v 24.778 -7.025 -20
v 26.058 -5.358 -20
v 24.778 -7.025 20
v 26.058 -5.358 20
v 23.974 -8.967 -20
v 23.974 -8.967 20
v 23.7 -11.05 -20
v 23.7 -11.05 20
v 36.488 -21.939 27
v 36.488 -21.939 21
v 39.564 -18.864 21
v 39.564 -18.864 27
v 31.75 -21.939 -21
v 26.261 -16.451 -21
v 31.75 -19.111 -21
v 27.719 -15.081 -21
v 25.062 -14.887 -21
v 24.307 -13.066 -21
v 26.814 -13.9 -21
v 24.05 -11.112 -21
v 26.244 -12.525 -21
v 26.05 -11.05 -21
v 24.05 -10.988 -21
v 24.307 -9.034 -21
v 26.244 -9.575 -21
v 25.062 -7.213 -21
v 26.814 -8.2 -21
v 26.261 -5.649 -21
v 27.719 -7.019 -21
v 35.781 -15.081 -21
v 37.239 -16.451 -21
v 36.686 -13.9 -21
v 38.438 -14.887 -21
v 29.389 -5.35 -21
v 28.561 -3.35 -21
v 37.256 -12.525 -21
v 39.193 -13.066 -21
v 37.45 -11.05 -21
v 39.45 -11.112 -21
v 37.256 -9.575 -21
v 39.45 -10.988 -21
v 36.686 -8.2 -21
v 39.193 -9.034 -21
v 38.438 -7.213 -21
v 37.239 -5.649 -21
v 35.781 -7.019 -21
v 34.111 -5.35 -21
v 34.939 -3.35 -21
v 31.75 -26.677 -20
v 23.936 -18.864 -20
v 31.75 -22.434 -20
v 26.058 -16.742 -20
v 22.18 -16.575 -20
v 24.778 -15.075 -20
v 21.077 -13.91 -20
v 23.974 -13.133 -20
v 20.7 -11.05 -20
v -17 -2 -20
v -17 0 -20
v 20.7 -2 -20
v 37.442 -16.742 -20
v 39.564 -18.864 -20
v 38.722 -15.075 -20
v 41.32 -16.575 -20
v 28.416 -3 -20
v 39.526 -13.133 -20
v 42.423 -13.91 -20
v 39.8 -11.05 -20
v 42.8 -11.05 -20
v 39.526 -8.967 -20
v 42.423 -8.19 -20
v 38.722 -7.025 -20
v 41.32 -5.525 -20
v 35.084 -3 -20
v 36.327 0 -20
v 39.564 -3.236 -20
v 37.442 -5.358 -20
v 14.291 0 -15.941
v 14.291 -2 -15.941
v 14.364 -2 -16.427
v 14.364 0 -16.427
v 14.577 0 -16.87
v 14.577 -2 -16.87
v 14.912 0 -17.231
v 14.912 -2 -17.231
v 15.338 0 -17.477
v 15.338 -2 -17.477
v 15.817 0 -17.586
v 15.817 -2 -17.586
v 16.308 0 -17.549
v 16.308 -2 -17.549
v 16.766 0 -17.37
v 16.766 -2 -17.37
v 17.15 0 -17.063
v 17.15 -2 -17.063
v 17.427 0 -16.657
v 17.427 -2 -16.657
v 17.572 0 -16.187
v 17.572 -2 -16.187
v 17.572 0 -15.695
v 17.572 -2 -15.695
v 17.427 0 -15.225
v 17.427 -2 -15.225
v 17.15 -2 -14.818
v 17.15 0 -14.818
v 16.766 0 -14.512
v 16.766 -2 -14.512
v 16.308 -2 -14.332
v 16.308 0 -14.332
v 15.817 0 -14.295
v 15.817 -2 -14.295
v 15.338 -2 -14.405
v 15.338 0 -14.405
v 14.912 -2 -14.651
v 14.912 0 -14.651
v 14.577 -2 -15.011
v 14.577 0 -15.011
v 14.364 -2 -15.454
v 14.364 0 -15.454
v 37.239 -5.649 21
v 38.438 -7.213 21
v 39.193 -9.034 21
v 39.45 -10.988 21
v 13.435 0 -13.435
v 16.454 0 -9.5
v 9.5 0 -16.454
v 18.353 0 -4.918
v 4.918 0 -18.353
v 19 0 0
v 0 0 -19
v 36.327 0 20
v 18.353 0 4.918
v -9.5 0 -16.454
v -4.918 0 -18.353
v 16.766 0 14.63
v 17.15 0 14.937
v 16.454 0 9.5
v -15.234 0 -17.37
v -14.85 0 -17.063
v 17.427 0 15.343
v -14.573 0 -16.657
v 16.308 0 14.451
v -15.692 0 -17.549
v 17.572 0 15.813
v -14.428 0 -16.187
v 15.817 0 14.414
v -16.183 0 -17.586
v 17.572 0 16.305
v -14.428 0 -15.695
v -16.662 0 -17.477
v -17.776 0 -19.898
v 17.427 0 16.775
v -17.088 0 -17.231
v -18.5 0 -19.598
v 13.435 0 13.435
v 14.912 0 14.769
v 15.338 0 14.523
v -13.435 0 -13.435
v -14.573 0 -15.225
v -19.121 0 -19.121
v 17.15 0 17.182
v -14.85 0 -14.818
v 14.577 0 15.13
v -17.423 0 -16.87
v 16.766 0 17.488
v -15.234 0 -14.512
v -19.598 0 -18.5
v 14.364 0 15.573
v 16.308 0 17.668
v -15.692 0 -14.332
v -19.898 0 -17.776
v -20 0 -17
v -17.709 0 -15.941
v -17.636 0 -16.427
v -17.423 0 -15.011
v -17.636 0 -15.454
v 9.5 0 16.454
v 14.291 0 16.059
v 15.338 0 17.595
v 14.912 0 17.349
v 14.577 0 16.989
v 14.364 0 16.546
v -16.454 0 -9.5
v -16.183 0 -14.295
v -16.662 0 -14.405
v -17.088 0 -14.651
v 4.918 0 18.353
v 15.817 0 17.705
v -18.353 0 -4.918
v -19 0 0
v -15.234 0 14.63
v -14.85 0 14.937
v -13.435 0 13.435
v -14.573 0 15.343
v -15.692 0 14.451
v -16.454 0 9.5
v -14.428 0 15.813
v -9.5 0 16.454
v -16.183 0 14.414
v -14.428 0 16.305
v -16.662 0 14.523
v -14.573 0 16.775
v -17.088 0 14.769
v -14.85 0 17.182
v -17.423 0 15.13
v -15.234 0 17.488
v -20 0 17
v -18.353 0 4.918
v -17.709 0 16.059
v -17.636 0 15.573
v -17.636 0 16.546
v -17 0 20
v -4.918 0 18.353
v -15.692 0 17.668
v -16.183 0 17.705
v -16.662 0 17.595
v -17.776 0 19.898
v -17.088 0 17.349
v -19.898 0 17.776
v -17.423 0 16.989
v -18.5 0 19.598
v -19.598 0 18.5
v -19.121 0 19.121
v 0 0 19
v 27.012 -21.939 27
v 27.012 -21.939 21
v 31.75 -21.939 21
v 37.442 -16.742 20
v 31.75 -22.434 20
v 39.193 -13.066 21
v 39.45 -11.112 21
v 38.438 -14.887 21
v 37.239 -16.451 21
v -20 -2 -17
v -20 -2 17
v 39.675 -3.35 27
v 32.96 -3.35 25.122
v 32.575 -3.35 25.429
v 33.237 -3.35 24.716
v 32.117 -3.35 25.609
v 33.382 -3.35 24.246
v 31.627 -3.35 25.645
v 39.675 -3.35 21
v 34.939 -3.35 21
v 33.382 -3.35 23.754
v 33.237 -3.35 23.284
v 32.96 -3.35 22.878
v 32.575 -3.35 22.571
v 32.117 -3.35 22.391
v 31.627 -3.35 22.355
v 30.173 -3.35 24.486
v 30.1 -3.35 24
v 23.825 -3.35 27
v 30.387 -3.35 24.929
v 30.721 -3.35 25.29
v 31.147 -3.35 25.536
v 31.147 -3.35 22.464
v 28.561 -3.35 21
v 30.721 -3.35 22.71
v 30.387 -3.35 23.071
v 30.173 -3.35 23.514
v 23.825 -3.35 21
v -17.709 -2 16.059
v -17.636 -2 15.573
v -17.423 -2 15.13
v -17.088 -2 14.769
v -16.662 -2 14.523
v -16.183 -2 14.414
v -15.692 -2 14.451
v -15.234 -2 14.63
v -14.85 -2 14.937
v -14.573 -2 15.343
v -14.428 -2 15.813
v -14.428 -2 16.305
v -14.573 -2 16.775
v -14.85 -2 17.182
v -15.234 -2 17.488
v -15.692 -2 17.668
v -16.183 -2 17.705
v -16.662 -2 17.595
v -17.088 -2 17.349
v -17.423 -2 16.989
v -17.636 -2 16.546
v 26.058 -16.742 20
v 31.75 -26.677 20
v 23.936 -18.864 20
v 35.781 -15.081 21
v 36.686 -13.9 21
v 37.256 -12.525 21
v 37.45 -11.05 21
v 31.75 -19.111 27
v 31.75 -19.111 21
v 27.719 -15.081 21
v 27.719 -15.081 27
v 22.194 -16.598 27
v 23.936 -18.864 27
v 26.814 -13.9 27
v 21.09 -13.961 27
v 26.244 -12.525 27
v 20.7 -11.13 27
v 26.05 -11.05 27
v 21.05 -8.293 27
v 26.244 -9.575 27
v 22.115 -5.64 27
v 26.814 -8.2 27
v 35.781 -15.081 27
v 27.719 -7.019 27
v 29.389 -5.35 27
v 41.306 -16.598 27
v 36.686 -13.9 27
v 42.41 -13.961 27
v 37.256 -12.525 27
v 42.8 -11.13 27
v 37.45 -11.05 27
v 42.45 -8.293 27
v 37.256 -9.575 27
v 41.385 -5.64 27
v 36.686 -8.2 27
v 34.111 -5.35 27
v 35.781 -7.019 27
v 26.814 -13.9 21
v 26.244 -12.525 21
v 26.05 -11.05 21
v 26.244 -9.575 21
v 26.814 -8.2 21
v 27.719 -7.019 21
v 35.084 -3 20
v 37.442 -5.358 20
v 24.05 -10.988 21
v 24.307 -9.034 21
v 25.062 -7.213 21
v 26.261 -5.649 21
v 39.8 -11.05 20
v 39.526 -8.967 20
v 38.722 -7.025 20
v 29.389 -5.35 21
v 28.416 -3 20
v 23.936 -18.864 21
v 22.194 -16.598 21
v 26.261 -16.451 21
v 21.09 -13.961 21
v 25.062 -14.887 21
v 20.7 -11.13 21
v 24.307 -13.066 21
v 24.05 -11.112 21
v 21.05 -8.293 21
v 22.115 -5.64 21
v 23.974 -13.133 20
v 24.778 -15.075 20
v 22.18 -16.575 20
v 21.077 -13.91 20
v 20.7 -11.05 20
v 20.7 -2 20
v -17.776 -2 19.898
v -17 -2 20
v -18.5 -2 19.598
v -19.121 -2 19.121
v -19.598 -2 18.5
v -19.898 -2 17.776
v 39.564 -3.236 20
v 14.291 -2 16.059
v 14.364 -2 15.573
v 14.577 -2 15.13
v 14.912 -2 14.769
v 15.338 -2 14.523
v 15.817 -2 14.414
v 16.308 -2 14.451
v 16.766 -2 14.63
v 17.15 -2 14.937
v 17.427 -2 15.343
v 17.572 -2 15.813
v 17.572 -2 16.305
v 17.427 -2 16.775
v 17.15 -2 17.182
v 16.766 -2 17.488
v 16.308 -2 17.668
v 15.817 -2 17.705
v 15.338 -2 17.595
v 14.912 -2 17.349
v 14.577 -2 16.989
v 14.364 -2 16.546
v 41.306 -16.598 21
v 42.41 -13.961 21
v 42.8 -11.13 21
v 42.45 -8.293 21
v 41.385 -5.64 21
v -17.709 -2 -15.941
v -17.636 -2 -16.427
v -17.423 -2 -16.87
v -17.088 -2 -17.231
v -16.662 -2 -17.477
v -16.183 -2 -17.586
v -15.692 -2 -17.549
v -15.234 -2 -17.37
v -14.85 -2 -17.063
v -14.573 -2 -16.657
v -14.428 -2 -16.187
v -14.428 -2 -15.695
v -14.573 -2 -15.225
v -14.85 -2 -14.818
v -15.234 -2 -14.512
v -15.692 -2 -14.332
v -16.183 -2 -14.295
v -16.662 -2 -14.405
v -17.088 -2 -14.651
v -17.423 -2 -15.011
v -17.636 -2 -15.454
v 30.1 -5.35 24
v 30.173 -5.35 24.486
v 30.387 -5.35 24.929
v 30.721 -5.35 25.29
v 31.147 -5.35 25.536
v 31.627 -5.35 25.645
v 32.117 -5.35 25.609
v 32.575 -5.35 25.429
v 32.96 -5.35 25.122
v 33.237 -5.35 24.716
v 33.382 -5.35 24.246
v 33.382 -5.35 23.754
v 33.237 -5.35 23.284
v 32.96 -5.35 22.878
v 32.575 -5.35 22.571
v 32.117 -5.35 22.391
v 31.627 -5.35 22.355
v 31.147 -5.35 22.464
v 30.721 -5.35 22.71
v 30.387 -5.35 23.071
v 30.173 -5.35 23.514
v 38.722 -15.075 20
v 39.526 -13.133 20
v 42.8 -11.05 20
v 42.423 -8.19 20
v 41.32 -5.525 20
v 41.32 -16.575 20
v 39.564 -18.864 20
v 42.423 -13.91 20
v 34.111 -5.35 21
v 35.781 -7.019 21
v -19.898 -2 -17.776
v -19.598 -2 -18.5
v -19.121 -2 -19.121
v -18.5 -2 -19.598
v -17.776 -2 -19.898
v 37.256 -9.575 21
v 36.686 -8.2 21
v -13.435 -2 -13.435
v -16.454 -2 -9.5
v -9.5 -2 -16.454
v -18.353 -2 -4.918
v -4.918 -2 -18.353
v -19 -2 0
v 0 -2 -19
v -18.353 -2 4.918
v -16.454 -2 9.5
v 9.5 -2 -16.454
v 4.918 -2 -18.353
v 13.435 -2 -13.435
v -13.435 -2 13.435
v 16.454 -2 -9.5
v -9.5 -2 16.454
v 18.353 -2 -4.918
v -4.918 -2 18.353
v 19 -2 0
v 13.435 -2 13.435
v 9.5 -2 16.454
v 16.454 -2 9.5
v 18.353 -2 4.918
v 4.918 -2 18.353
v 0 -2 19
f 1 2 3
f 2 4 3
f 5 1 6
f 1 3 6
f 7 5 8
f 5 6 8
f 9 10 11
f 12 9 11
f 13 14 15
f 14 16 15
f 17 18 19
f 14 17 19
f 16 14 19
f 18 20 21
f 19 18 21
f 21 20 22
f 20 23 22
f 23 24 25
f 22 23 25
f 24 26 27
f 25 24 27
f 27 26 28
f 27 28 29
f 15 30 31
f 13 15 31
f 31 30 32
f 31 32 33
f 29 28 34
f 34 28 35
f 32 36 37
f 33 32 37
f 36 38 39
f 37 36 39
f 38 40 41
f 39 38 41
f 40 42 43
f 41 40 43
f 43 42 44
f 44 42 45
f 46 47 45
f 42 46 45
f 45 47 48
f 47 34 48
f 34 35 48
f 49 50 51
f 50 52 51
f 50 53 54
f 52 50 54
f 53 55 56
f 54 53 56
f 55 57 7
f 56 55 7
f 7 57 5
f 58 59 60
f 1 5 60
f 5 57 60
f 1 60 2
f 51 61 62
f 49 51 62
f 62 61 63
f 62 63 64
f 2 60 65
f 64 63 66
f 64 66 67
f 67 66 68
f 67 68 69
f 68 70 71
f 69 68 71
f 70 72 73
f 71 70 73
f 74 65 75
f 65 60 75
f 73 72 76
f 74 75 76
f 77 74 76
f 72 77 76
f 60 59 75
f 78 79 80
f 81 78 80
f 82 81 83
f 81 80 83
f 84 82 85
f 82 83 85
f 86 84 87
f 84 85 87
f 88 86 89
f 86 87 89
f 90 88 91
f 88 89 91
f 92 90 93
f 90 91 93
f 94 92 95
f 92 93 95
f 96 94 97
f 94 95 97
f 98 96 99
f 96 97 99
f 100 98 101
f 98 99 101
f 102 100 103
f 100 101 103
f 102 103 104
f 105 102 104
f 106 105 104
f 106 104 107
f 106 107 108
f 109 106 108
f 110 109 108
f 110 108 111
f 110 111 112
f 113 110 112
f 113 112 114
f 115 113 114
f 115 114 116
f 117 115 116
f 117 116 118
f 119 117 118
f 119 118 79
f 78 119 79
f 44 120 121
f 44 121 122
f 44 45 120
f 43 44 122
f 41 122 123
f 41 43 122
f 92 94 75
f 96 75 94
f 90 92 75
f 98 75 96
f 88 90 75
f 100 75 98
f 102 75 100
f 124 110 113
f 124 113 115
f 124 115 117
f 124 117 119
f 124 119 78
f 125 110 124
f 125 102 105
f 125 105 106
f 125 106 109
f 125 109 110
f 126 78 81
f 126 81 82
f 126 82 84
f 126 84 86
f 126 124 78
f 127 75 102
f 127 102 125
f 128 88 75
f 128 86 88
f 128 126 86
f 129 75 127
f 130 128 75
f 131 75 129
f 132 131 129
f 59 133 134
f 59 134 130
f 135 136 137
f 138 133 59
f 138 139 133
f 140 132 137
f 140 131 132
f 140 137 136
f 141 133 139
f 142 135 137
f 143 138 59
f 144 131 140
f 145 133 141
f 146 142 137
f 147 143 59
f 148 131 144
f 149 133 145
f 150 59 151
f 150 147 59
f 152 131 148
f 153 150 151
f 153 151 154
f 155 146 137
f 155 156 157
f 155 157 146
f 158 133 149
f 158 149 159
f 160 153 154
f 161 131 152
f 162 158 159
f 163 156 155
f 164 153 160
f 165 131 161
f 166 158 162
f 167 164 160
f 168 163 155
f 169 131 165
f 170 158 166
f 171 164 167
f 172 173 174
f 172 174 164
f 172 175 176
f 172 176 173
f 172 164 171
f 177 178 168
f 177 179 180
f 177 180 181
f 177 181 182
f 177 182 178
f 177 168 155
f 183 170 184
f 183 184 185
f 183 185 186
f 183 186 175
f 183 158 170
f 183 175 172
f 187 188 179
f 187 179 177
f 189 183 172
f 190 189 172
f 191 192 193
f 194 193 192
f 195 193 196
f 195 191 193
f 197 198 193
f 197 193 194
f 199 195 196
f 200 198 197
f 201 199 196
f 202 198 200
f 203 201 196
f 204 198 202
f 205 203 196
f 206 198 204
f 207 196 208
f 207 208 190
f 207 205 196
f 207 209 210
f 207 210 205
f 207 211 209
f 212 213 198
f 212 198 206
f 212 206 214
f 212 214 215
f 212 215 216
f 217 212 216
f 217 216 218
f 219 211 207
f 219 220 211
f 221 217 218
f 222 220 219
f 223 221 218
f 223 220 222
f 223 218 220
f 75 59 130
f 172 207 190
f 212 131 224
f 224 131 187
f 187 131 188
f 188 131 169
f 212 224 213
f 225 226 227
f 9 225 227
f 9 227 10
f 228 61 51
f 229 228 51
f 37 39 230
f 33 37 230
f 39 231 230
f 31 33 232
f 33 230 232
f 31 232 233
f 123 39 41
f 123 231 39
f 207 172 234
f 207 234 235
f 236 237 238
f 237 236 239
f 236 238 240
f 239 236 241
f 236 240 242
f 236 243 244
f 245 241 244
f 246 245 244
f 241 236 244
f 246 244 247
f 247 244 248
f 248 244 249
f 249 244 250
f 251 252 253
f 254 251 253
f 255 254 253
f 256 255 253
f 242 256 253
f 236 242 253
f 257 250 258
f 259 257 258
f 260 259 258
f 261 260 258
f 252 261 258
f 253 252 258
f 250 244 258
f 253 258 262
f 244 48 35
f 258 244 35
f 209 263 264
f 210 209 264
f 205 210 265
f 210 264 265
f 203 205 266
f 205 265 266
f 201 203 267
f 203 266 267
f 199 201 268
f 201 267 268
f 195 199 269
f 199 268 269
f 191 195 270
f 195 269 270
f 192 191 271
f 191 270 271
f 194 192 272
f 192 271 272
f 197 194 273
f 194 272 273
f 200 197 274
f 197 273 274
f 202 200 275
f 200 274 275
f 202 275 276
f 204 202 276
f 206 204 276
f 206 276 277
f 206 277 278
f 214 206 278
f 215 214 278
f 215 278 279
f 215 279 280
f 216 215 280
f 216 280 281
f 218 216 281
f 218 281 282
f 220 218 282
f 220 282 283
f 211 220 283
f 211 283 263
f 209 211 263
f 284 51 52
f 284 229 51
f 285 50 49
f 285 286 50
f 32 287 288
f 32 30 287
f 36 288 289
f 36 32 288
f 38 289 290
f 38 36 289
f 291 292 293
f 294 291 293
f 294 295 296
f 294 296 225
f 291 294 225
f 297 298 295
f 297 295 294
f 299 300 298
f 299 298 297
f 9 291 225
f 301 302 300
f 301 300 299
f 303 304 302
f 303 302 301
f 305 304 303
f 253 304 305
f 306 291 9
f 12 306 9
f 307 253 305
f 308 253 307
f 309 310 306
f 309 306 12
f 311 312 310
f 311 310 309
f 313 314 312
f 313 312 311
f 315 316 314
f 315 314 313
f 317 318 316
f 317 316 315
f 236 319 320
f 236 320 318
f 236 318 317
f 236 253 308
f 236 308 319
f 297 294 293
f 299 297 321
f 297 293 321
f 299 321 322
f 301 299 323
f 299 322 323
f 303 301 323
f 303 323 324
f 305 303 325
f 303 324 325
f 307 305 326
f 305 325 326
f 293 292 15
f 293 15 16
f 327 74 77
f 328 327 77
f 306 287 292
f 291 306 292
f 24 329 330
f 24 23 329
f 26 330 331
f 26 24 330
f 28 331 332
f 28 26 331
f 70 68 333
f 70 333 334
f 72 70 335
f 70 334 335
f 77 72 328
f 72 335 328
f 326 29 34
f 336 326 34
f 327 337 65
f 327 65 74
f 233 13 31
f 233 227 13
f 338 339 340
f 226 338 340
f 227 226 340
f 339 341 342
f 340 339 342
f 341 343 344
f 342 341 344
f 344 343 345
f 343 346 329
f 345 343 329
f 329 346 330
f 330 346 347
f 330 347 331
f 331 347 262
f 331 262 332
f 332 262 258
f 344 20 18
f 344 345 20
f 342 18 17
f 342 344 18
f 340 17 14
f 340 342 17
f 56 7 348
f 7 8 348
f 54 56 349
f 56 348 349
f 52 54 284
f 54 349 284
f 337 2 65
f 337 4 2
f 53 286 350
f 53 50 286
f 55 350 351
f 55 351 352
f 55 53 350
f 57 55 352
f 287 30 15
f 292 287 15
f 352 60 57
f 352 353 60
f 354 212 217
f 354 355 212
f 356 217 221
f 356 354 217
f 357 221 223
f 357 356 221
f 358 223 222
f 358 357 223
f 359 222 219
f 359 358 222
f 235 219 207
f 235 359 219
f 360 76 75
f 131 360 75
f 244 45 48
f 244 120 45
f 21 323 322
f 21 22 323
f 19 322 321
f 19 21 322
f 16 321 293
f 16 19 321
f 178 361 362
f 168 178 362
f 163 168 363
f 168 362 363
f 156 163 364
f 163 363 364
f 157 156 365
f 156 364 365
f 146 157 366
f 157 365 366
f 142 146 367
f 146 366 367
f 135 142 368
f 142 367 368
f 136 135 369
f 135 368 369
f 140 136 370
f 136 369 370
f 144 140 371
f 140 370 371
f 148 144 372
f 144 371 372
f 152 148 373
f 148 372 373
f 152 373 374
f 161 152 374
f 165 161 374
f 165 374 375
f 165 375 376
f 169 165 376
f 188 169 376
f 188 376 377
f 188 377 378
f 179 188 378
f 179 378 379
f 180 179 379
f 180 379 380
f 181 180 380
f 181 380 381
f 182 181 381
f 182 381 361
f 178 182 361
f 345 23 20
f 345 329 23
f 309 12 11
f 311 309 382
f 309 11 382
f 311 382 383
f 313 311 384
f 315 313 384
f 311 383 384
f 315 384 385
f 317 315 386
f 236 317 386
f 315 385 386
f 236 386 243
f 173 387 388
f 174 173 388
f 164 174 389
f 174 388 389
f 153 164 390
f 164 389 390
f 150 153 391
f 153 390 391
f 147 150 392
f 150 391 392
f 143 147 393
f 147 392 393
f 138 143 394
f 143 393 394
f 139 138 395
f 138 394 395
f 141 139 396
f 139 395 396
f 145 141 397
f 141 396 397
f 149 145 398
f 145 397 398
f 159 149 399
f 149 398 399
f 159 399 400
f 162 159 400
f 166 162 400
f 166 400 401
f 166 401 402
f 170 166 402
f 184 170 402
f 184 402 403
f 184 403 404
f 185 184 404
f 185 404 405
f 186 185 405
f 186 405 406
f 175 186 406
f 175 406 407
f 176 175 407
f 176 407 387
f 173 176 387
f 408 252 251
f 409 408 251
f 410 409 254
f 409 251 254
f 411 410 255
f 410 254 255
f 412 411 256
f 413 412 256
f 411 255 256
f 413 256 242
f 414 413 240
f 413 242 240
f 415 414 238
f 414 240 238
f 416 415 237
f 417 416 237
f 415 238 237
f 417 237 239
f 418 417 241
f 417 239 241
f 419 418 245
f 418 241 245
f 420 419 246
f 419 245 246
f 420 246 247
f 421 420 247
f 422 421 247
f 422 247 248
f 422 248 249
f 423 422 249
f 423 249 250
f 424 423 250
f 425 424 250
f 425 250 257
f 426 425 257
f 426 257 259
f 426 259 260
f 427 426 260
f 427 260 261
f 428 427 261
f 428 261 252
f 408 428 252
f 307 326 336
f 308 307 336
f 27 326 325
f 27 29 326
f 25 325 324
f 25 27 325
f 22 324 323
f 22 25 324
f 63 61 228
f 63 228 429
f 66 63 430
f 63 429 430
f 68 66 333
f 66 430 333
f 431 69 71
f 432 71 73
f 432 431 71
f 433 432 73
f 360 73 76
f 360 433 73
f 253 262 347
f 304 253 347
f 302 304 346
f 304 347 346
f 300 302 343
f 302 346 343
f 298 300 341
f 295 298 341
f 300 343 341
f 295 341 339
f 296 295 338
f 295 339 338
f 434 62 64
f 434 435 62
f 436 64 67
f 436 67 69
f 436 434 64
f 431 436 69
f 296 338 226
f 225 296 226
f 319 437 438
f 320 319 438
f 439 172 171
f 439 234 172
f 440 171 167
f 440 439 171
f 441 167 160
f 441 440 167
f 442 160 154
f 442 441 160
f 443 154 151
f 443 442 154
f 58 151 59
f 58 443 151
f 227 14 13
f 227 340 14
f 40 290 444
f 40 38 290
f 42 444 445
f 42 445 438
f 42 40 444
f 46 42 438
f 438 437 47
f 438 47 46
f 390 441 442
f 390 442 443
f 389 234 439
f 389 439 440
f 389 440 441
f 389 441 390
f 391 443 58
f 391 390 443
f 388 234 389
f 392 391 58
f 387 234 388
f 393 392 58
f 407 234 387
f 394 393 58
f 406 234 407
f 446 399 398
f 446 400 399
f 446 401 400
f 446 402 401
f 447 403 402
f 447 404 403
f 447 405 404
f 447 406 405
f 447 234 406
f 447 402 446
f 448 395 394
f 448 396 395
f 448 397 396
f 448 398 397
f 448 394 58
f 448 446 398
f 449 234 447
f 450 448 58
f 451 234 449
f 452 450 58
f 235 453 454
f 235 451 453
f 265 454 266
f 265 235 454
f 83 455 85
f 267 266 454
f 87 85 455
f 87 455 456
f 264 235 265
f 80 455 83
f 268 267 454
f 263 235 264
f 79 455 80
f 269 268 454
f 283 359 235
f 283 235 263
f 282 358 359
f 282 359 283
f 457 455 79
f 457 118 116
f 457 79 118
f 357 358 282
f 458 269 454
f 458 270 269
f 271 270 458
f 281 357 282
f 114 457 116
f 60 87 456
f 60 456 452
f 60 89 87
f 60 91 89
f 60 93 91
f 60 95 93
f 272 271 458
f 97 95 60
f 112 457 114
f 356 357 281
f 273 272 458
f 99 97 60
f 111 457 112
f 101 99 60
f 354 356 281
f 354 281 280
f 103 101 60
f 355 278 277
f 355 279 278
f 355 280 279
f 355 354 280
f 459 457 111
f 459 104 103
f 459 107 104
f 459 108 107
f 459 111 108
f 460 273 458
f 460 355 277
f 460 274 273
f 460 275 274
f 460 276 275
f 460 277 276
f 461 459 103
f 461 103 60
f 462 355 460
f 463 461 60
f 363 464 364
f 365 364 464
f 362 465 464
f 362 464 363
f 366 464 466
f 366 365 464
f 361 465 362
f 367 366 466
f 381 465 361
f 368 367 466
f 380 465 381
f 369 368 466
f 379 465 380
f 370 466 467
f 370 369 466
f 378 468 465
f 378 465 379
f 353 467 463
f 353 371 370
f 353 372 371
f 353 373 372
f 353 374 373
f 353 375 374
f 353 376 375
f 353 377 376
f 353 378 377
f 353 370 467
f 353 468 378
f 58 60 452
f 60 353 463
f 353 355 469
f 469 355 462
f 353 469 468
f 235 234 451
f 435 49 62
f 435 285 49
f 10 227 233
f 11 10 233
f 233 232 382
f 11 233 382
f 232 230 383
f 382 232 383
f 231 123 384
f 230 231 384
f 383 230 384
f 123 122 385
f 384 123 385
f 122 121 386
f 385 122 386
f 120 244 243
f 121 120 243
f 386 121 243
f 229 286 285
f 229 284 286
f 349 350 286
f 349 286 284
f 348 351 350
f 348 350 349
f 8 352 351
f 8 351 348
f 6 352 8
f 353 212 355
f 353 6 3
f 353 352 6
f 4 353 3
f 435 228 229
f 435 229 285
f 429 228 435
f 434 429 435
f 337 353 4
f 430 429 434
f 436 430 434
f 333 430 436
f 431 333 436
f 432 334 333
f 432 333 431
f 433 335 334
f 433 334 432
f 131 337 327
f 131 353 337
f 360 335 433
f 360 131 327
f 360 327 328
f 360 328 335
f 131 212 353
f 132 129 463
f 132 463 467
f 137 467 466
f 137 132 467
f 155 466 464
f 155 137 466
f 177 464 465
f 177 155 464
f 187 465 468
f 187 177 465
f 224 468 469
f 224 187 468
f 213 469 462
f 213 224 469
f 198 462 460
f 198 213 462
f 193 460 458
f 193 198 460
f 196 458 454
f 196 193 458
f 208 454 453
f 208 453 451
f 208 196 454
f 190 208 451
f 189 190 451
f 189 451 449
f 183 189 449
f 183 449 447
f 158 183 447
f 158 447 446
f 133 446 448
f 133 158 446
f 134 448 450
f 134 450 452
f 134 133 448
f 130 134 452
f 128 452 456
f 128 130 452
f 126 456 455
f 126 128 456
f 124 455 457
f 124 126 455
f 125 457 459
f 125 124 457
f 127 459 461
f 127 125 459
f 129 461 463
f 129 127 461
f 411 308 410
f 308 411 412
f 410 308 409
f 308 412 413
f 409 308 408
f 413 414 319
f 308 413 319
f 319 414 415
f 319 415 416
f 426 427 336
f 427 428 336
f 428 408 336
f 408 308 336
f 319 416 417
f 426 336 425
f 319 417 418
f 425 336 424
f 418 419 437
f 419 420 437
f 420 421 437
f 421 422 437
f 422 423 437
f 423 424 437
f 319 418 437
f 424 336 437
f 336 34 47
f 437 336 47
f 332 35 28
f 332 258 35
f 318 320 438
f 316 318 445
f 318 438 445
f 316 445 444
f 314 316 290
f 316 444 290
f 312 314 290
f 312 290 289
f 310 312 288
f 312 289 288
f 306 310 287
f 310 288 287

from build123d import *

# Parameters (mm, degrees)
F0_W      = 40
F0_H      = 40
F0_R      = 19
F1_DEPTH  = 2
F2_D      = 3.3
F4_DEPTH  = 20
F5_R      = 8.04999
F6_R      = 11.04999
F8_DEPTH  = 21
F9_R      = 7.55
F10_R     = 5.69999
F12_DEPTH = 6
F13_R     = 1.65
F14_DEPTH = 5
F15_R     = 3


# Not quite as in the source:
# - a fillet or chamfer is up to 0.001 mm smaller than in the source, because OpenCascade refuses the exact size


with BuildPart() as f1:
    # F0 (on Front) → F1 (new body)
    with BuildSketch(Plane.XZ):
        Rectangle(F0_W, F0_H)
        Circle(F0_R, mode=Mode.SUBTRACT)
    extrude(amount=F1_DEPTH)

    # F2 (through all)
    with Locations(Plane(origin=(0, 0, 0), x_dir=(1, 0, 0), z_dir=(0, 1, 0))):
        with Locations((-16.059378162, -16.059378162), (15.940621838, -16.059378162), (15.940621838, 15.940621838), (-16.059378162, 15.940621838)):
            Hole(F2_D / 2)

    # F3 (on Top) → F4 (join, symmetric)
    with BuildSketch(Plane.XY):
        Polygon((20.7, -15.6270598642), (27.1729401358, -22.1), (31.75, -26.6770598642), (36.3270598642, -22.1), (42.8, -15.6270598642), (42.8, -6.4729401358), (36.3270598642, 0), (27.1729401358, 0), (20, 0), (20, -2), (20.7, -2), (20.7, -6.4729401358), align=None)
        Polygon((39.8, -7.7155808229), (39.8, -14.3844191771), (35.0844191771, -19.1), (31.75, -22.4344191771), (28.4155808229, -19.1), (23.7, -14.3844191771), (23.7, -7.7155808229), (28.4155808229, -3), (35.0844191771, -3), align=None, mode=Mode.SUBTRACT)
    extrude(amount=F4_DEPTH, both=True)

    # F5 (radius 8.05 in the source; OpenCascade refuses exactly that, so slightly less here)
    f5_edges = [f1.edges().sort_by_distance(p)[0] for p in [
        (23.7, -7.715581, 0),
        (23.7, -14.384419, 0),
        (39.8, -7.715581, 0),
        (39.8, -14.384419, 0),
    ]]
    fillet(f5_edges, radius=F5_R)

    # F6 (radius 11.05 in the source; OpenCascade refuses exactly that, so slightly less here)
    f6_edges = [f1.edges().sort_by_distance(p)[0] for p in [
        (20.7, -15.62706, 0),
        (42.8, -15.62706, 0),
        (42.8, -6.47294, 0),
    ]]
    fillet(f6_edges, radius=F6_R)

    # F15
    f15_edges = [f1.edges().sort_by_distance(p)[0] for p in [
        (-20, -1, 20),
        (-20, -1, -20),
    ]]
    fillet(f15_edges, radius=F15_R)


with BuildPart() as f8:
    # F7 (on Top) → F8 (new body, symmetric)
    with BuildSketch(Plane.XY):
        Polygon((24.05, -7.8605555697), (24.05, -14.2394444303), (31.75, -21.9394444303), (39.45, -14.2394444303), (39.45, -7.8605555697), (34.9394444303, -3.35), (28.5605555697, -3.35), align=None)
        Polygon((31.75, -19.1110173055), (26.05, -13.4110173055), (26.05, -8.6889826945), (29.3889826945, -5.35), (34.1110173055, -5.35), (37.45, -8.6889826945), (37.45, -13.4110173055), align=None, mode=Mode.SUBTRACT)
    extrude(amount=F8_DEPTH, both=True)

    # F9
    f9_edges = [f8.edges().sort_by_distance(p)[0] for p in [
        (39.45, -14.239444, 0),
        (39.45, -7.860556, 0),
        (24.05, -14.239444, 0),
        (24.05, -7.860556, 0),
    ]]
    fillet(f9_edges, radius=F9_R)

    # F10 (radius 5.7 in the source; OpenCascade refuses exactly that, so slightly less here)
    f10_edges = [f8.edges().sort_by_distance(p)[0] for p in [
        (37.45, -8.688983, 0),
        (37.45, -13.411017, 0),
        (26.05, -8.688983, 0),
        (26.05, -13.411017, 0),
    ]]
    fillet(f10_edges, radius=F10_R)

    # F11 (on face) → F12 (join)
    with BuildSketch(Plane.XY.offset(21)):
        with BuildLine():
            ThreePointArc((23.8245662579, -3.35), (20.7002874642, -11.1297049374), (23.9364700679, -18.8635299321))
            Line((23.9364700679, -18.8635299321), (27.0123845661, -21.9394444303))
            Line((27.0123845661, -21.9394444303), (36.4876154339, -21.9394444303))
            Line((36.4876154339, -21.9394444303), (39.5635299321, -18.8635299321))
            ThreePointArc((39.5635299321, -18.8635299321), (42.7997125358, -11.1297049374), (39.6754337421, -3.35))
            Line((39.6754337421, -3.35), (23.8245662579, -3.35))
        make_face()
        with BuildLine():
            Line((27.7194913472, -7.0194913472), (29.3889826945, -5.35))
            Line((29.3889826945, -5.35), (34.1110173055, -5.35))
            Line((34.1110173055, -5.35), (35.7805086528, -7.0194913472))
            ThreePointArc((35.7805086528, -7.0194913472), (37.45, -11.05), (35.7805086528, -15.0805086528))
            Line((35.7805086528, -15.0805086528), (31.75, -19.1110173055))
            Line((31.75, -19.1110173055), (27.7194913472, -15.0805086528))
            ThreePointArc((27.7194913472, -15.0805086528), (26.05, -11.05), (27.7194913472, -7.0194913472))
        make_face(mode=Mode.SUBTRACT)
    extrude(amount=F12_DEPTH)

    # F13 (on face) → F14 (cut)
    with BuildSketch(Plane(origin=(0, -3.35, 0), x_dir=(-1, 0, 0), z_dir=(0, 1, 0))):
        with Locations((-31.75, 24)):
            Circle(F13_R)
    extrude(amount=-F14_DEPTH, mode=Mode.SUBTRACT)


solid = Compound([f1.part, f8.part])
